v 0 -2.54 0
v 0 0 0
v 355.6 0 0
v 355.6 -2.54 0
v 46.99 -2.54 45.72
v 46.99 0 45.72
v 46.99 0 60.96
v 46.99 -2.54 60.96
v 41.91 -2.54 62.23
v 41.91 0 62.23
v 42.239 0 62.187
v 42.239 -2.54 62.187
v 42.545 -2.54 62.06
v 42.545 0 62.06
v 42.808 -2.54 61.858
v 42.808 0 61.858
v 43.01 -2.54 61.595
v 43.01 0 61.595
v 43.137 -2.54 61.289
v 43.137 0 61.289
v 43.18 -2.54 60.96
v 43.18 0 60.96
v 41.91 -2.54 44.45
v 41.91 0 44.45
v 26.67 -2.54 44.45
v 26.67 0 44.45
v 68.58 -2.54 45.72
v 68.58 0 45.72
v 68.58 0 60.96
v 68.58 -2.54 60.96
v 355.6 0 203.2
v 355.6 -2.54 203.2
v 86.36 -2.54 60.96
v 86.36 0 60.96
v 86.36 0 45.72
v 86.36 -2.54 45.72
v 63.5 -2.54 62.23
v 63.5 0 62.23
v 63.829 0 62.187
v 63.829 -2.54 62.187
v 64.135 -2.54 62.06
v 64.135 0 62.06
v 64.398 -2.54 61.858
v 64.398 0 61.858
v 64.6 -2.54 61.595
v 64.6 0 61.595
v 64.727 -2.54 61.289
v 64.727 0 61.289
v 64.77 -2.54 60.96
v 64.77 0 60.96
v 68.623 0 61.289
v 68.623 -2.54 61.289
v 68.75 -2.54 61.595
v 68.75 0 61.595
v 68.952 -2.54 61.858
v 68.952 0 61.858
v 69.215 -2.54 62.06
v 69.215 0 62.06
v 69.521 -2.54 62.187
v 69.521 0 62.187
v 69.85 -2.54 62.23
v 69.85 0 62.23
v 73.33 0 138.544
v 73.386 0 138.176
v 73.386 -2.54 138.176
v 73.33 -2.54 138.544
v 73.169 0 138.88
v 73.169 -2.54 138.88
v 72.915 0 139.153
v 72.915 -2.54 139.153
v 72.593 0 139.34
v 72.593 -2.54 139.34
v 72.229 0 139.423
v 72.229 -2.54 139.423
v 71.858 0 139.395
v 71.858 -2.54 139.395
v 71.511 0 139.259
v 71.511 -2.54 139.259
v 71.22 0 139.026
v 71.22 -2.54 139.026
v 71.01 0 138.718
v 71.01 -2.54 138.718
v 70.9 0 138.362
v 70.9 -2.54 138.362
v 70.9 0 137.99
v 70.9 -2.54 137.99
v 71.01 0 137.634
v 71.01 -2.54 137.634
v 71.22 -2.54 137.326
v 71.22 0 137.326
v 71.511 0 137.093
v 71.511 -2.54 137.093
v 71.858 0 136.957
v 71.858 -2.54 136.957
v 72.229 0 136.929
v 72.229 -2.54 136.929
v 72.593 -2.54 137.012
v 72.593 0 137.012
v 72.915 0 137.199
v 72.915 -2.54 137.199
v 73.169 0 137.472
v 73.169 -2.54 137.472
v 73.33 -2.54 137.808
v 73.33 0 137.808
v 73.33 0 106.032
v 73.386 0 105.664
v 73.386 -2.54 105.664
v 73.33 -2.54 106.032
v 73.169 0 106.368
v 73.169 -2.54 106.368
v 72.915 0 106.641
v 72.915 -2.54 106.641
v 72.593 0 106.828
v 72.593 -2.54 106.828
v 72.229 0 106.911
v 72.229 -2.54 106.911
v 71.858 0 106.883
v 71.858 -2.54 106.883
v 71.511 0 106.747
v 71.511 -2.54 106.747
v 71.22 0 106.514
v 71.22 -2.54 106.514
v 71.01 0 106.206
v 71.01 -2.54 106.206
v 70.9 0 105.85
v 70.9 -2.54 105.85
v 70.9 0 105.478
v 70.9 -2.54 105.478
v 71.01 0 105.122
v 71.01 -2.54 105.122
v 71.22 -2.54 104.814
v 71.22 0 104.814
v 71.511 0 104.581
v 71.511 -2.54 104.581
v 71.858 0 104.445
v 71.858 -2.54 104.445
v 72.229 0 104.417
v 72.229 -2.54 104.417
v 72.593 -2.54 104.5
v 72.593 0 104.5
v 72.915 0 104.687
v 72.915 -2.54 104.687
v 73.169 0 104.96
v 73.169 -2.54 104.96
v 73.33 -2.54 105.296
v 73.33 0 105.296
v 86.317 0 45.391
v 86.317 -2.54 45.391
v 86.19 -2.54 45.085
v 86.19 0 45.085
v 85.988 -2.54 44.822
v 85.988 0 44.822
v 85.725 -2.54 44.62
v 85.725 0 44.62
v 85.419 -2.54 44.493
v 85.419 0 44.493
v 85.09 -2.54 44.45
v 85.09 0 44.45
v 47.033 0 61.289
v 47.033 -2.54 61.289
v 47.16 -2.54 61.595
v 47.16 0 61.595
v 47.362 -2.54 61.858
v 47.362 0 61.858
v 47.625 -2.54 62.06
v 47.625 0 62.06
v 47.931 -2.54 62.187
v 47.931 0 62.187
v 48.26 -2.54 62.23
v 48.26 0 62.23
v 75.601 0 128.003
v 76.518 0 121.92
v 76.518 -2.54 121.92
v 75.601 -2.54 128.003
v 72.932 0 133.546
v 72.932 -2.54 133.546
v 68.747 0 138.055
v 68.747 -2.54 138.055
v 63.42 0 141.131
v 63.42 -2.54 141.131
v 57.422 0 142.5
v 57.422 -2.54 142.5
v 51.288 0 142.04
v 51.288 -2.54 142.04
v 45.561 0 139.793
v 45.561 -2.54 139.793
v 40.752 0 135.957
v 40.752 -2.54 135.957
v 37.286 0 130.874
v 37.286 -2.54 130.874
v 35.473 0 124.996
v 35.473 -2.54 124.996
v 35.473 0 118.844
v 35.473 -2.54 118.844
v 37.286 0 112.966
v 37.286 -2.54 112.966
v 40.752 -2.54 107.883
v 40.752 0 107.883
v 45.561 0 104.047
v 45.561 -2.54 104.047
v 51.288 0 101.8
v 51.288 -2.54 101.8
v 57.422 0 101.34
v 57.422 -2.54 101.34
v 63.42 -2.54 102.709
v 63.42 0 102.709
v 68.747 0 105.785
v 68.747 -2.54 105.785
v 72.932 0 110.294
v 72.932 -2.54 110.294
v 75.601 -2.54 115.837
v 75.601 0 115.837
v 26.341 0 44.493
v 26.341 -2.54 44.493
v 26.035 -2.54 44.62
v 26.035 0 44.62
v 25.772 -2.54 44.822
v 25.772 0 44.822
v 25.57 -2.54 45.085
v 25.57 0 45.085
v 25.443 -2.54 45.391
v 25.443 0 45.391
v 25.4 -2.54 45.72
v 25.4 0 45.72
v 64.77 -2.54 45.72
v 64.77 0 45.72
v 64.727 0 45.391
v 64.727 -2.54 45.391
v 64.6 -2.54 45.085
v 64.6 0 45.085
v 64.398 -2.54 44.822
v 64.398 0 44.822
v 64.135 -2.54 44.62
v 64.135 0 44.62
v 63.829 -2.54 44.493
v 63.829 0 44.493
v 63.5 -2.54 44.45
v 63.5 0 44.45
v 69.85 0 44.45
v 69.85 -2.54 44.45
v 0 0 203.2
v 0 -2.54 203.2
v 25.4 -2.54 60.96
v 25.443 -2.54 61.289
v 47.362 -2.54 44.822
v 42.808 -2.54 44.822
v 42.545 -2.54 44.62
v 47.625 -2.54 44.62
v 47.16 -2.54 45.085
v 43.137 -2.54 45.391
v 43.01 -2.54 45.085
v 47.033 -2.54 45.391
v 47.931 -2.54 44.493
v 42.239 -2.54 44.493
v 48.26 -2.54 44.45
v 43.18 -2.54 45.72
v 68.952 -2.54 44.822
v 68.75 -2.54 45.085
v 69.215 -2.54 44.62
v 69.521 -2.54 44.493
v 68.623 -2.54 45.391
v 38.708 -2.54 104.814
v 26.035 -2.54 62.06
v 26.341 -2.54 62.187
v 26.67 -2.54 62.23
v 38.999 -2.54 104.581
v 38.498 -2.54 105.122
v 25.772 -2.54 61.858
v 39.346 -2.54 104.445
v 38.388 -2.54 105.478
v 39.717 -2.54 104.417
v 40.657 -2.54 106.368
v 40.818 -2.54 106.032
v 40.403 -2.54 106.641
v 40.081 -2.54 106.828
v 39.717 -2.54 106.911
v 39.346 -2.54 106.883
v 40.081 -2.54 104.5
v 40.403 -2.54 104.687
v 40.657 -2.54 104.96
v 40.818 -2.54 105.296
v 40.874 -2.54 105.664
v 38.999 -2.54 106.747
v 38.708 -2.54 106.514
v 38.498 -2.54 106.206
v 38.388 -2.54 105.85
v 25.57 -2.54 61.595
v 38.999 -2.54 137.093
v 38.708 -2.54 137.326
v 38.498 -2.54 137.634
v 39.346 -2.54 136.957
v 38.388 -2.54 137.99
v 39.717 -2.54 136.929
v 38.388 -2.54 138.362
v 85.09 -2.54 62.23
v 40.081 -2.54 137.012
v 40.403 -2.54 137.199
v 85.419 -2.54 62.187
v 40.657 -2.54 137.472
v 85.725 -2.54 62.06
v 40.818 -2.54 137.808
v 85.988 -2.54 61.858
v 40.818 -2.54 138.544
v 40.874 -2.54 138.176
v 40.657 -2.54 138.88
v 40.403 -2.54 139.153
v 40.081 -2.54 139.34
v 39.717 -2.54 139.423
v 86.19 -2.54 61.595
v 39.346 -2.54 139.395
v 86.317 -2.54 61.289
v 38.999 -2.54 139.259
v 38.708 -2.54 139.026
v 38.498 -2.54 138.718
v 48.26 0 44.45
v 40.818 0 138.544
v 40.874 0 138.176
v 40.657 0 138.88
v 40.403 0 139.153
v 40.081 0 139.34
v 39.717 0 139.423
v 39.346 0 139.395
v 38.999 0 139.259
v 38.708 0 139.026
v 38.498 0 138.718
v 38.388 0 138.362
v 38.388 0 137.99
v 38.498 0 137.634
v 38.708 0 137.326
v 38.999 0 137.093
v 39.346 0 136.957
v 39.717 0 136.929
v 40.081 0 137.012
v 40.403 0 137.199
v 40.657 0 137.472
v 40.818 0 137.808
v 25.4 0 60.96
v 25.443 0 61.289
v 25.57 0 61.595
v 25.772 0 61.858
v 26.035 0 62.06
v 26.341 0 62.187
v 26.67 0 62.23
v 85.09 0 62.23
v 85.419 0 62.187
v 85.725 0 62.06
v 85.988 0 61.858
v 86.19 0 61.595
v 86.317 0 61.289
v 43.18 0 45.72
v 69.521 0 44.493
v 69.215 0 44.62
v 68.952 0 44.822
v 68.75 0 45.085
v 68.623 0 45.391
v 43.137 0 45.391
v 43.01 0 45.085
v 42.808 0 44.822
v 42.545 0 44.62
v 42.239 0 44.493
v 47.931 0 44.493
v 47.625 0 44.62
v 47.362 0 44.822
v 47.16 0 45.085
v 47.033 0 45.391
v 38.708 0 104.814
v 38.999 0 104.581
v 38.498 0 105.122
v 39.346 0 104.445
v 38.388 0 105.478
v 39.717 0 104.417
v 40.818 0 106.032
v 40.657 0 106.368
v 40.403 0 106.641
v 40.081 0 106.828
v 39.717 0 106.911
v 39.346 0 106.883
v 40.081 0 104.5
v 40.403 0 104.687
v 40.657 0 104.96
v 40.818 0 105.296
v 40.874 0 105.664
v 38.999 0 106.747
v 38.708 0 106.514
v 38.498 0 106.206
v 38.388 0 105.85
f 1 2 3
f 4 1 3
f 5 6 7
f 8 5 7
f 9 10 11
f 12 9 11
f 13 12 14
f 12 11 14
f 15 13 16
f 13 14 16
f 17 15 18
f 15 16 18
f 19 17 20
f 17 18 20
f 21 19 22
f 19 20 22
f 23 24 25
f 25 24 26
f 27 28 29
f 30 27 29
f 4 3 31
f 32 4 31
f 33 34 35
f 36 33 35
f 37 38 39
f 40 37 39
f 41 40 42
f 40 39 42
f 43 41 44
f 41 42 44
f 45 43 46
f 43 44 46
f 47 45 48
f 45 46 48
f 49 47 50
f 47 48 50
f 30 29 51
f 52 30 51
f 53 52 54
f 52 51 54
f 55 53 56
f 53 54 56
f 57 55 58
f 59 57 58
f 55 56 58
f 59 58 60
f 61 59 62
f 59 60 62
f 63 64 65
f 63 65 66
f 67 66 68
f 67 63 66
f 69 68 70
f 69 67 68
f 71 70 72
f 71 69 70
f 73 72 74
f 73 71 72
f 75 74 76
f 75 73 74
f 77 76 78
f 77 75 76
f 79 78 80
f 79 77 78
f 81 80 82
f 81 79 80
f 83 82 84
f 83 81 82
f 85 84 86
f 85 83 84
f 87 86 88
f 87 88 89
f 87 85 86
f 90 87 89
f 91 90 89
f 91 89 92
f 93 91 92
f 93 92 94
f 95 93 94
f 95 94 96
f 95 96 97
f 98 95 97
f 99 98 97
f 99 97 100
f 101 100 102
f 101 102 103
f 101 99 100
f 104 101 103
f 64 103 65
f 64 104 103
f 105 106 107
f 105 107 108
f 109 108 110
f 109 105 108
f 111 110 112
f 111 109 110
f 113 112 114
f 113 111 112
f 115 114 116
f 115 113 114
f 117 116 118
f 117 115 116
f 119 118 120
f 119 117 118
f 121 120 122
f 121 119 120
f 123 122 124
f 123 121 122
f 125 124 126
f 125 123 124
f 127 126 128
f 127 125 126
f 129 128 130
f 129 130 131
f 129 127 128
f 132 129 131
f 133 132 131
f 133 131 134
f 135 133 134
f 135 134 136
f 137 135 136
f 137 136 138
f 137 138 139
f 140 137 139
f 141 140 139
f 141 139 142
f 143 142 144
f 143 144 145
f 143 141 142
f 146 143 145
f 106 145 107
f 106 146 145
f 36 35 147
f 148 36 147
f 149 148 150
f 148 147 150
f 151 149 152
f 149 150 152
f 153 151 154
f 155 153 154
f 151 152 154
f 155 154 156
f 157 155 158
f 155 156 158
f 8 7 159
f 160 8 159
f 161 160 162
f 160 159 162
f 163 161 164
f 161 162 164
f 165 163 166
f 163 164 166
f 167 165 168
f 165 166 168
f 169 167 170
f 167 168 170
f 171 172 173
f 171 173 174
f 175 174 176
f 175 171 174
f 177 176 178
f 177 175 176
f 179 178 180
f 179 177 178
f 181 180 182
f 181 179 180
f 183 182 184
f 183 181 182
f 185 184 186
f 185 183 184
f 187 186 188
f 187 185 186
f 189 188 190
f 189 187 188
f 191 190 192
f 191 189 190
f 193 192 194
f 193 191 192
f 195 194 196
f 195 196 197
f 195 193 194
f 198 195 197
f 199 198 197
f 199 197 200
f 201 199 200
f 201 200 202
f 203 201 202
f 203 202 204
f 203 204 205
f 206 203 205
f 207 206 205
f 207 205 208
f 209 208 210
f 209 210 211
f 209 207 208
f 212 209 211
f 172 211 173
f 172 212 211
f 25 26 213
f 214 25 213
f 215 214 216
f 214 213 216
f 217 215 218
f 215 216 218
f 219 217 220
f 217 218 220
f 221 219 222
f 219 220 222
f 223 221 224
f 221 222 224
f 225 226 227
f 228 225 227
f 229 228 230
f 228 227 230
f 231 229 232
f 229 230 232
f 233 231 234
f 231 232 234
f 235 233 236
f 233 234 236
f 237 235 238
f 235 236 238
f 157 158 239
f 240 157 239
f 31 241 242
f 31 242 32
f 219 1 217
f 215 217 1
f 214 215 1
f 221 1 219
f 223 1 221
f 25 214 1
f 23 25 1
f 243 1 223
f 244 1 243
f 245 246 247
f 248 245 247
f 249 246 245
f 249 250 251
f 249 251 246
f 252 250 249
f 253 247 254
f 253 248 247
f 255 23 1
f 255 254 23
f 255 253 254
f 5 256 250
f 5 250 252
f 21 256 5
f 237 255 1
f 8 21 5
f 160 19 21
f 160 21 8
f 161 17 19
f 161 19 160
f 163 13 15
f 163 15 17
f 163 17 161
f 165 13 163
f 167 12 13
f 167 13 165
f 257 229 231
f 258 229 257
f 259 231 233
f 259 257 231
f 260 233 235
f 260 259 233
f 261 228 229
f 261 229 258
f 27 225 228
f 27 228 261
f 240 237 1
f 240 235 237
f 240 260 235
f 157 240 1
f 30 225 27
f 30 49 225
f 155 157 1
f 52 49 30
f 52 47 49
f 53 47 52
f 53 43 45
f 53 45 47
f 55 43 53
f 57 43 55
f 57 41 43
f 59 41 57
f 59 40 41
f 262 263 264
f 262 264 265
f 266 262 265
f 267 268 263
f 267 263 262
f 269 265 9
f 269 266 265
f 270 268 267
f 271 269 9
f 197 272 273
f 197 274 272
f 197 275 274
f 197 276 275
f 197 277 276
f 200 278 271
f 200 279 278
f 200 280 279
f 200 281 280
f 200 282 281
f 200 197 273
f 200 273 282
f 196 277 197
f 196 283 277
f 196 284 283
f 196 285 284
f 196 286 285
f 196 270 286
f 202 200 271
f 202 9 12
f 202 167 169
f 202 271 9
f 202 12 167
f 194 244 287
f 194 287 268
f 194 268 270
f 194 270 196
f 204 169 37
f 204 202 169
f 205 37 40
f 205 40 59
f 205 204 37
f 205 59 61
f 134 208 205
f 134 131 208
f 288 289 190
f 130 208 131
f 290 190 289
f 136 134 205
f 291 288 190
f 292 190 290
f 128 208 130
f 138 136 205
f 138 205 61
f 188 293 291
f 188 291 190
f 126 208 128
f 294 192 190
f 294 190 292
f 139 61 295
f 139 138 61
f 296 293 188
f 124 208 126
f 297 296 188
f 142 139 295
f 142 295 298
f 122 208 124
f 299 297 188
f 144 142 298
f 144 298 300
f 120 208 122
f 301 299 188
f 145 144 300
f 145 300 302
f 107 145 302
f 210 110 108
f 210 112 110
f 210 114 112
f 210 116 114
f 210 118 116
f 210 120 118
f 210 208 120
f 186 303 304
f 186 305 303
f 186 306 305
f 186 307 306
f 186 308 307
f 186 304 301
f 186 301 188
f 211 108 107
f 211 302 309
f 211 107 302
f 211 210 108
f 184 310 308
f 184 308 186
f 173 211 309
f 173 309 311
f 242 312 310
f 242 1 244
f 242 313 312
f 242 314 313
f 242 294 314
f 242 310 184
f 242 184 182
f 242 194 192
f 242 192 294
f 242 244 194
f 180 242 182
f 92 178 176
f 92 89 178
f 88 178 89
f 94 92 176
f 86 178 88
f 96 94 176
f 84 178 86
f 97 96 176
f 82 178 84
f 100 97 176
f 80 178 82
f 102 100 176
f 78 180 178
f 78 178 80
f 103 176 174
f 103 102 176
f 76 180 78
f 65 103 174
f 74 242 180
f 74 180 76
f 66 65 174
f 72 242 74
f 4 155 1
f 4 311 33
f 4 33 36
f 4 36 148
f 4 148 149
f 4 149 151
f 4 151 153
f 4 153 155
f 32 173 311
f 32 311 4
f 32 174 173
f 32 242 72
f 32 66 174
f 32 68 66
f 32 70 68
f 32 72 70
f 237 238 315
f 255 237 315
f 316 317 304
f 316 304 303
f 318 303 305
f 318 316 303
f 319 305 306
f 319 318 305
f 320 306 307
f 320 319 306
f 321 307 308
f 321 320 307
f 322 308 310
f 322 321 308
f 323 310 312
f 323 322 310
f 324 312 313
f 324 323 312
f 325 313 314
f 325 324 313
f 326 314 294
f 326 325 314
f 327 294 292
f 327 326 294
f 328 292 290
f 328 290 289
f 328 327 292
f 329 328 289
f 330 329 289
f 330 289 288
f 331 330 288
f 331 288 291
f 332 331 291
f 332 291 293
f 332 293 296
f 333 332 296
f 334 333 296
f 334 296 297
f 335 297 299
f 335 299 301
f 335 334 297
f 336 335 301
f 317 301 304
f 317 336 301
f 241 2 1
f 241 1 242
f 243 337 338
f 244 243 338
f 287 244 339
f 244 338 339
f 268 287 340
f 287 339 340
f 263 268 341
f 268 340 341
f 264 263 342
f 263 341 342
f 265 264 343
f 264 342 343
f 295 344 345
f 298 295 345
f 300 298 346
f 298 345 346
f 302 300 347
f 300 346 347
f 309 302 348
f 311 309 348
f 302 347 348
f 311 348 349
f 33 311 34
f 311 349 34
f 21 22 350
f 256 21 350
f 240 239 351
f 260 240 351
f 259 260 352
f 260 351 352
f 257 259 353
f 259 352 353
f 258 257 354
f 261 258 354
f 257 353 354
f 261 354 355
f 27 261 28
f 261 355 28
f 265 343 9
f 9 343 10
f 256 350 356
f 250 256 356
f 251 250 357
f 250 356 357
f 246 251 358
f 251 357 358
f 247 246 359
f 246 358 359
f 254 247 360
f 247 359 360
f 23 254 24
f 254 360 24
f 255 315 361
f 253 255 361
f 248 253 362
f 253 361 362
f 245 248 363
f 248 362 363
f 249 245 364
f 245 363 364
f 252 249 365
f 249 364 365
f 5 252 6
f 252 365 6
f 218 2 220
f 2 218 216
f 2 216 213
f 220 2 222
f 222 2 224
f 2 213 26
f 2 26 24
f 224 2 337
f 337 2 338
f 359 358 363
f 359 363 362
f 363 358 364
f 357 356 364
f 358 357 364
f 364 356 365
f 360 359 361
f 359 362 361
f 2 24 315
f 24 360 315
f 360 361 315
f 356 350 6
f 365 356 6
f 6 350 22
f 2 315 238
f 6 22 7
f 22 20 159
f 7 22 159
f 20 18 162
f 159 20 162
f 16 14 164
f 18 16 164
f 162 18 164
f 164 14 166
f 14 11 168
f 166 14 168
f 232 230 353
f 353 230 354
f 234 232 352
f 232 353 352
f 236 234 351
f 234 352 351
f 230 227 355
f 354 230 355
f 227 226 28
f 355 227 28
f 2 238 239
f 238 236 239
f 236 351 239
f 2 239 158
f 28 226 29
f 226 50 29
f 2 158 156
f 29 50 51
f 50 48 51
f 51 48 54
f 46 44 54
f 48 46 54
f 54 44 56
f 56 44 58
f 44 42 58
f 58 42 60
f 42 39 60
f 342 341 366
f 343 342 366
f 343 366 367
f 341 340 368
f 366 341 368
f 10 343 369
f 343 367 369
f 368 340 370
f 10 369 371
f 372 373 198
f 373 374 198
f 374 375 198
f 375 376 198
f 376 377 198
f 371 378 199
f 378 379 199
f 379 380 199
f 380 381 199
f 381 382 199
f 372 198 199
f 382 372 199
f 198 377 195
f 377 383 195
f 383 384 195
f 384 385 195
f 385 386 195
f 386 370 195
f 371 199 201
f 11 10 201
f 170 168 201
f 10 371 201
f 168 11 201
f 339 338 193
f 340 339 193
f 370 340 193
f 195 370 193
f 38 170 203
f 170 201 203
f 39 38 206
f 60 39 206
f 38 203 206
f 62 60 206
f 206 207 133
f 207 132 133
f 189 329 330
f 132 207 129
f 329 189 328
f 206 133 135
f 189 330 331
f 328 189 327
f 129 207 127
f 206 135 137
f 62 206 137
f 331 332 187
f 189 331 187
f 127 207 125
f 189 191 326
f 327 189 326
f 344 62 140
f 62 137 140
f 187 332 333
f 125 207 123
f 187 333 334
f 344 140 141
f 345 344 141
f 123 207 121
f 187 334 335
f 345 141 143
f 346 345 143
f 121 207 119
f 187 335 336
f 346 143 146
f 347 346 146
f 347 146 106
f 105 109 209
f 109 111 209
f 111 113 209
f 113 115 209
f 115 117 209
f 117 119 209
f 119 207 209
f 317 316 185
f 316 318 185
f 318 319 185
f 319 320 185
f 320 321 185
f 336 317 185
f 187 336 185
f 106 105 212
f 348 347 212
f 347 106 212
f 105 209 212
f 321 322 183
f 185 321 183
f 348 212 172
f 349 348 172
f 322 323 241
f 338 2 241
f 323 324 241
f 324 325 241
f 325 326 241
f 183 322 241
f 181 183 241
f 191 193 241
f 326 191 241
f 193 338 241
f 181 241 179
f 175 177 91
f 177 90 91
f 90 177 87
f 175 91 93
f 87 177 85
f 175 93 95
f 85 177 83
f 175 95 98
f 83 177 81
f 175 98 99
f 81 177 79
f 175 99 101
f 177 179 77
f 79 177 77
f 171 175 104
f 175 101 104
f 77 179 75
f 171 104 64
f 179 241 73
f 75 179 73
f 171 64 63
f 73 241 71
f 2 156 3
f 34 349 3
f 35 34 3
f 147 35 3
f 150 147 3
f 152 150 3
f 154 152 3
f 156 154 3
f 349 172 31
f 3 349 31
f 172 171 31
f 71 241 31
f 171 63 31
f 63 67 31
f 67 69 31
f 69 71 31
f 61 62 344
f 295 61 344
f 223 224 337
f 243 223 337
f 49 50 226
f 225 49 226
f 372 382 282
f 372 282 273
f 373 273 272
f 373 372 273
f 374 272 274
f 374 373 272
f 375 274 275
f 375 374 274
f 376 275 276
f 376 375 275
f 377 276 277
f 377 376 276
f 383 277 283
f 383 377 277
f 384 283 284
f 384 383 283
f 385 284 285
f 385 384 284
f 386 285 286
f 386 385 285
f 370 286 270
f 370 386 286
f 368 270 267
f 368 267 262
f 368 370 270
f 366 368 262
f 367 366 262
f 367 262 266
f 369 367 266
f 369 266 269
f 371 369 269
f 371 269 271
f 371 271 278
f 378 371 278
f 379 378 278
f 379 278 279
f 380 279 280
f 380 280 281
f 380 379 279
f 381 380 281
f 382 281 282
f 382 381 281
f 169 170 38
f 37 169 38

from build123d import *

# Parameters (mm, degrees)
F0_W     = 355.6
F0_H     = 203.2
F0_R     = 1.25
F0_R_2   = 20.6375
F1_DEPTH = 2.54


with BuildPart() as f1:
    # F0 (on Front) → F1 (new body)
    with BuildSketch(Plane.XZ):
        with Locations((177.8, 101.6)):
            Rectangle(F0_W, F0_H)
        with BuildLine():
            Line((26.67, 62.23), (41.91, 62.23))
            ThreePointArc((41.91, 62.23), (42.808026, 61.858026), (43.18, 60.96))
            Line((43.18, 60.96), (43.18, 45.72))
            ThreePointArc((43.18, 45.72), (42.808026, 44.821974), (41.91, 44.45))
            Line((41.91, 44.45), (26.67, 44.45))
            ThreePointArc((26.67, 44.45), (25.771974, 44.821974), (25.4, 45.72))
            Line((25.4, 45.72), (25.4, 60.96))
            ThreePointArc((25.4, 60.96), (25.771974, 61.858026), (26.67, 62.23))
        make_face(mode=Mode.SUBTRACT)
        with BuildLine():
            Line((48.26, 62.23), (63.5, 62.23))
            ThreePointArc((63.5, 62.23), (64.398026, 61.858026), (64.77, 60.96))
            Line((64.77, 60.96), (64.77, 45.72))
            ThreePointArc((64.77, 45.72), (64.398026, 44.821974), (63.5, 44.45))
            Line((63.5, 44.45), (48.26, 44.45))
            ThreePointArc((48.26, 44.45), (47.361974, 44.821974), (46.99, 45.72))
            Line((46.99, 45.72), (46.99, 60.96))
            ThreePointArc((46.99, 60.96), (47.361974, 61.858026), (48.26, 62.23))
        make_face(mode=Mode.SUBTRACT)
        with BuildLine():
            Line((69.85, 62.23), (85.09, 62.23))
            ThreePointArc((85.09, 62.23), (85.988026, 61.858026), (86.36, 60.96))
            Line((86.36, 60.96), (86.36, 45.72))
            ThreePointArc((86.36, 45.72), (85.988026, 44.821974), (85.09, 44.45))
            Line((85.09, 44.45), (69.85, 44.45))
            ThreePointArc((69.85, 44.45), (68.951974, 44.821974), (68.58, 45.72))
            Line((68.58, 45.72), (68.58, 60.96))
            ThreePointArc((68.58, 60.96), (68.951974, 61.858026), (69.85, 62.23))
        make_face(mode=Mode.SUBTRACT)
        with Locations((39.624, 105.664)):
            Circle(F0_R, mode=Mode.SUBTRACT)
        with Locations((72.136, 105.664)):
            Circle(F0_R, mode=Mode.SUBTRACT)
        with Locations((55.88, 121.92)):
            Circle(F0_R_2, mode=Mode.SUBTRACT)
        with Locations((39.624, 138.176)):
            Circle(F0_R, mode=Mode.SUBTRACT)
        with Locations((72.136, 138.176)):
            Circle(F0_R, mode=Mode.SUBTRACT)
    extrude(amount=F1_DEPTH)


solid = f1.part
